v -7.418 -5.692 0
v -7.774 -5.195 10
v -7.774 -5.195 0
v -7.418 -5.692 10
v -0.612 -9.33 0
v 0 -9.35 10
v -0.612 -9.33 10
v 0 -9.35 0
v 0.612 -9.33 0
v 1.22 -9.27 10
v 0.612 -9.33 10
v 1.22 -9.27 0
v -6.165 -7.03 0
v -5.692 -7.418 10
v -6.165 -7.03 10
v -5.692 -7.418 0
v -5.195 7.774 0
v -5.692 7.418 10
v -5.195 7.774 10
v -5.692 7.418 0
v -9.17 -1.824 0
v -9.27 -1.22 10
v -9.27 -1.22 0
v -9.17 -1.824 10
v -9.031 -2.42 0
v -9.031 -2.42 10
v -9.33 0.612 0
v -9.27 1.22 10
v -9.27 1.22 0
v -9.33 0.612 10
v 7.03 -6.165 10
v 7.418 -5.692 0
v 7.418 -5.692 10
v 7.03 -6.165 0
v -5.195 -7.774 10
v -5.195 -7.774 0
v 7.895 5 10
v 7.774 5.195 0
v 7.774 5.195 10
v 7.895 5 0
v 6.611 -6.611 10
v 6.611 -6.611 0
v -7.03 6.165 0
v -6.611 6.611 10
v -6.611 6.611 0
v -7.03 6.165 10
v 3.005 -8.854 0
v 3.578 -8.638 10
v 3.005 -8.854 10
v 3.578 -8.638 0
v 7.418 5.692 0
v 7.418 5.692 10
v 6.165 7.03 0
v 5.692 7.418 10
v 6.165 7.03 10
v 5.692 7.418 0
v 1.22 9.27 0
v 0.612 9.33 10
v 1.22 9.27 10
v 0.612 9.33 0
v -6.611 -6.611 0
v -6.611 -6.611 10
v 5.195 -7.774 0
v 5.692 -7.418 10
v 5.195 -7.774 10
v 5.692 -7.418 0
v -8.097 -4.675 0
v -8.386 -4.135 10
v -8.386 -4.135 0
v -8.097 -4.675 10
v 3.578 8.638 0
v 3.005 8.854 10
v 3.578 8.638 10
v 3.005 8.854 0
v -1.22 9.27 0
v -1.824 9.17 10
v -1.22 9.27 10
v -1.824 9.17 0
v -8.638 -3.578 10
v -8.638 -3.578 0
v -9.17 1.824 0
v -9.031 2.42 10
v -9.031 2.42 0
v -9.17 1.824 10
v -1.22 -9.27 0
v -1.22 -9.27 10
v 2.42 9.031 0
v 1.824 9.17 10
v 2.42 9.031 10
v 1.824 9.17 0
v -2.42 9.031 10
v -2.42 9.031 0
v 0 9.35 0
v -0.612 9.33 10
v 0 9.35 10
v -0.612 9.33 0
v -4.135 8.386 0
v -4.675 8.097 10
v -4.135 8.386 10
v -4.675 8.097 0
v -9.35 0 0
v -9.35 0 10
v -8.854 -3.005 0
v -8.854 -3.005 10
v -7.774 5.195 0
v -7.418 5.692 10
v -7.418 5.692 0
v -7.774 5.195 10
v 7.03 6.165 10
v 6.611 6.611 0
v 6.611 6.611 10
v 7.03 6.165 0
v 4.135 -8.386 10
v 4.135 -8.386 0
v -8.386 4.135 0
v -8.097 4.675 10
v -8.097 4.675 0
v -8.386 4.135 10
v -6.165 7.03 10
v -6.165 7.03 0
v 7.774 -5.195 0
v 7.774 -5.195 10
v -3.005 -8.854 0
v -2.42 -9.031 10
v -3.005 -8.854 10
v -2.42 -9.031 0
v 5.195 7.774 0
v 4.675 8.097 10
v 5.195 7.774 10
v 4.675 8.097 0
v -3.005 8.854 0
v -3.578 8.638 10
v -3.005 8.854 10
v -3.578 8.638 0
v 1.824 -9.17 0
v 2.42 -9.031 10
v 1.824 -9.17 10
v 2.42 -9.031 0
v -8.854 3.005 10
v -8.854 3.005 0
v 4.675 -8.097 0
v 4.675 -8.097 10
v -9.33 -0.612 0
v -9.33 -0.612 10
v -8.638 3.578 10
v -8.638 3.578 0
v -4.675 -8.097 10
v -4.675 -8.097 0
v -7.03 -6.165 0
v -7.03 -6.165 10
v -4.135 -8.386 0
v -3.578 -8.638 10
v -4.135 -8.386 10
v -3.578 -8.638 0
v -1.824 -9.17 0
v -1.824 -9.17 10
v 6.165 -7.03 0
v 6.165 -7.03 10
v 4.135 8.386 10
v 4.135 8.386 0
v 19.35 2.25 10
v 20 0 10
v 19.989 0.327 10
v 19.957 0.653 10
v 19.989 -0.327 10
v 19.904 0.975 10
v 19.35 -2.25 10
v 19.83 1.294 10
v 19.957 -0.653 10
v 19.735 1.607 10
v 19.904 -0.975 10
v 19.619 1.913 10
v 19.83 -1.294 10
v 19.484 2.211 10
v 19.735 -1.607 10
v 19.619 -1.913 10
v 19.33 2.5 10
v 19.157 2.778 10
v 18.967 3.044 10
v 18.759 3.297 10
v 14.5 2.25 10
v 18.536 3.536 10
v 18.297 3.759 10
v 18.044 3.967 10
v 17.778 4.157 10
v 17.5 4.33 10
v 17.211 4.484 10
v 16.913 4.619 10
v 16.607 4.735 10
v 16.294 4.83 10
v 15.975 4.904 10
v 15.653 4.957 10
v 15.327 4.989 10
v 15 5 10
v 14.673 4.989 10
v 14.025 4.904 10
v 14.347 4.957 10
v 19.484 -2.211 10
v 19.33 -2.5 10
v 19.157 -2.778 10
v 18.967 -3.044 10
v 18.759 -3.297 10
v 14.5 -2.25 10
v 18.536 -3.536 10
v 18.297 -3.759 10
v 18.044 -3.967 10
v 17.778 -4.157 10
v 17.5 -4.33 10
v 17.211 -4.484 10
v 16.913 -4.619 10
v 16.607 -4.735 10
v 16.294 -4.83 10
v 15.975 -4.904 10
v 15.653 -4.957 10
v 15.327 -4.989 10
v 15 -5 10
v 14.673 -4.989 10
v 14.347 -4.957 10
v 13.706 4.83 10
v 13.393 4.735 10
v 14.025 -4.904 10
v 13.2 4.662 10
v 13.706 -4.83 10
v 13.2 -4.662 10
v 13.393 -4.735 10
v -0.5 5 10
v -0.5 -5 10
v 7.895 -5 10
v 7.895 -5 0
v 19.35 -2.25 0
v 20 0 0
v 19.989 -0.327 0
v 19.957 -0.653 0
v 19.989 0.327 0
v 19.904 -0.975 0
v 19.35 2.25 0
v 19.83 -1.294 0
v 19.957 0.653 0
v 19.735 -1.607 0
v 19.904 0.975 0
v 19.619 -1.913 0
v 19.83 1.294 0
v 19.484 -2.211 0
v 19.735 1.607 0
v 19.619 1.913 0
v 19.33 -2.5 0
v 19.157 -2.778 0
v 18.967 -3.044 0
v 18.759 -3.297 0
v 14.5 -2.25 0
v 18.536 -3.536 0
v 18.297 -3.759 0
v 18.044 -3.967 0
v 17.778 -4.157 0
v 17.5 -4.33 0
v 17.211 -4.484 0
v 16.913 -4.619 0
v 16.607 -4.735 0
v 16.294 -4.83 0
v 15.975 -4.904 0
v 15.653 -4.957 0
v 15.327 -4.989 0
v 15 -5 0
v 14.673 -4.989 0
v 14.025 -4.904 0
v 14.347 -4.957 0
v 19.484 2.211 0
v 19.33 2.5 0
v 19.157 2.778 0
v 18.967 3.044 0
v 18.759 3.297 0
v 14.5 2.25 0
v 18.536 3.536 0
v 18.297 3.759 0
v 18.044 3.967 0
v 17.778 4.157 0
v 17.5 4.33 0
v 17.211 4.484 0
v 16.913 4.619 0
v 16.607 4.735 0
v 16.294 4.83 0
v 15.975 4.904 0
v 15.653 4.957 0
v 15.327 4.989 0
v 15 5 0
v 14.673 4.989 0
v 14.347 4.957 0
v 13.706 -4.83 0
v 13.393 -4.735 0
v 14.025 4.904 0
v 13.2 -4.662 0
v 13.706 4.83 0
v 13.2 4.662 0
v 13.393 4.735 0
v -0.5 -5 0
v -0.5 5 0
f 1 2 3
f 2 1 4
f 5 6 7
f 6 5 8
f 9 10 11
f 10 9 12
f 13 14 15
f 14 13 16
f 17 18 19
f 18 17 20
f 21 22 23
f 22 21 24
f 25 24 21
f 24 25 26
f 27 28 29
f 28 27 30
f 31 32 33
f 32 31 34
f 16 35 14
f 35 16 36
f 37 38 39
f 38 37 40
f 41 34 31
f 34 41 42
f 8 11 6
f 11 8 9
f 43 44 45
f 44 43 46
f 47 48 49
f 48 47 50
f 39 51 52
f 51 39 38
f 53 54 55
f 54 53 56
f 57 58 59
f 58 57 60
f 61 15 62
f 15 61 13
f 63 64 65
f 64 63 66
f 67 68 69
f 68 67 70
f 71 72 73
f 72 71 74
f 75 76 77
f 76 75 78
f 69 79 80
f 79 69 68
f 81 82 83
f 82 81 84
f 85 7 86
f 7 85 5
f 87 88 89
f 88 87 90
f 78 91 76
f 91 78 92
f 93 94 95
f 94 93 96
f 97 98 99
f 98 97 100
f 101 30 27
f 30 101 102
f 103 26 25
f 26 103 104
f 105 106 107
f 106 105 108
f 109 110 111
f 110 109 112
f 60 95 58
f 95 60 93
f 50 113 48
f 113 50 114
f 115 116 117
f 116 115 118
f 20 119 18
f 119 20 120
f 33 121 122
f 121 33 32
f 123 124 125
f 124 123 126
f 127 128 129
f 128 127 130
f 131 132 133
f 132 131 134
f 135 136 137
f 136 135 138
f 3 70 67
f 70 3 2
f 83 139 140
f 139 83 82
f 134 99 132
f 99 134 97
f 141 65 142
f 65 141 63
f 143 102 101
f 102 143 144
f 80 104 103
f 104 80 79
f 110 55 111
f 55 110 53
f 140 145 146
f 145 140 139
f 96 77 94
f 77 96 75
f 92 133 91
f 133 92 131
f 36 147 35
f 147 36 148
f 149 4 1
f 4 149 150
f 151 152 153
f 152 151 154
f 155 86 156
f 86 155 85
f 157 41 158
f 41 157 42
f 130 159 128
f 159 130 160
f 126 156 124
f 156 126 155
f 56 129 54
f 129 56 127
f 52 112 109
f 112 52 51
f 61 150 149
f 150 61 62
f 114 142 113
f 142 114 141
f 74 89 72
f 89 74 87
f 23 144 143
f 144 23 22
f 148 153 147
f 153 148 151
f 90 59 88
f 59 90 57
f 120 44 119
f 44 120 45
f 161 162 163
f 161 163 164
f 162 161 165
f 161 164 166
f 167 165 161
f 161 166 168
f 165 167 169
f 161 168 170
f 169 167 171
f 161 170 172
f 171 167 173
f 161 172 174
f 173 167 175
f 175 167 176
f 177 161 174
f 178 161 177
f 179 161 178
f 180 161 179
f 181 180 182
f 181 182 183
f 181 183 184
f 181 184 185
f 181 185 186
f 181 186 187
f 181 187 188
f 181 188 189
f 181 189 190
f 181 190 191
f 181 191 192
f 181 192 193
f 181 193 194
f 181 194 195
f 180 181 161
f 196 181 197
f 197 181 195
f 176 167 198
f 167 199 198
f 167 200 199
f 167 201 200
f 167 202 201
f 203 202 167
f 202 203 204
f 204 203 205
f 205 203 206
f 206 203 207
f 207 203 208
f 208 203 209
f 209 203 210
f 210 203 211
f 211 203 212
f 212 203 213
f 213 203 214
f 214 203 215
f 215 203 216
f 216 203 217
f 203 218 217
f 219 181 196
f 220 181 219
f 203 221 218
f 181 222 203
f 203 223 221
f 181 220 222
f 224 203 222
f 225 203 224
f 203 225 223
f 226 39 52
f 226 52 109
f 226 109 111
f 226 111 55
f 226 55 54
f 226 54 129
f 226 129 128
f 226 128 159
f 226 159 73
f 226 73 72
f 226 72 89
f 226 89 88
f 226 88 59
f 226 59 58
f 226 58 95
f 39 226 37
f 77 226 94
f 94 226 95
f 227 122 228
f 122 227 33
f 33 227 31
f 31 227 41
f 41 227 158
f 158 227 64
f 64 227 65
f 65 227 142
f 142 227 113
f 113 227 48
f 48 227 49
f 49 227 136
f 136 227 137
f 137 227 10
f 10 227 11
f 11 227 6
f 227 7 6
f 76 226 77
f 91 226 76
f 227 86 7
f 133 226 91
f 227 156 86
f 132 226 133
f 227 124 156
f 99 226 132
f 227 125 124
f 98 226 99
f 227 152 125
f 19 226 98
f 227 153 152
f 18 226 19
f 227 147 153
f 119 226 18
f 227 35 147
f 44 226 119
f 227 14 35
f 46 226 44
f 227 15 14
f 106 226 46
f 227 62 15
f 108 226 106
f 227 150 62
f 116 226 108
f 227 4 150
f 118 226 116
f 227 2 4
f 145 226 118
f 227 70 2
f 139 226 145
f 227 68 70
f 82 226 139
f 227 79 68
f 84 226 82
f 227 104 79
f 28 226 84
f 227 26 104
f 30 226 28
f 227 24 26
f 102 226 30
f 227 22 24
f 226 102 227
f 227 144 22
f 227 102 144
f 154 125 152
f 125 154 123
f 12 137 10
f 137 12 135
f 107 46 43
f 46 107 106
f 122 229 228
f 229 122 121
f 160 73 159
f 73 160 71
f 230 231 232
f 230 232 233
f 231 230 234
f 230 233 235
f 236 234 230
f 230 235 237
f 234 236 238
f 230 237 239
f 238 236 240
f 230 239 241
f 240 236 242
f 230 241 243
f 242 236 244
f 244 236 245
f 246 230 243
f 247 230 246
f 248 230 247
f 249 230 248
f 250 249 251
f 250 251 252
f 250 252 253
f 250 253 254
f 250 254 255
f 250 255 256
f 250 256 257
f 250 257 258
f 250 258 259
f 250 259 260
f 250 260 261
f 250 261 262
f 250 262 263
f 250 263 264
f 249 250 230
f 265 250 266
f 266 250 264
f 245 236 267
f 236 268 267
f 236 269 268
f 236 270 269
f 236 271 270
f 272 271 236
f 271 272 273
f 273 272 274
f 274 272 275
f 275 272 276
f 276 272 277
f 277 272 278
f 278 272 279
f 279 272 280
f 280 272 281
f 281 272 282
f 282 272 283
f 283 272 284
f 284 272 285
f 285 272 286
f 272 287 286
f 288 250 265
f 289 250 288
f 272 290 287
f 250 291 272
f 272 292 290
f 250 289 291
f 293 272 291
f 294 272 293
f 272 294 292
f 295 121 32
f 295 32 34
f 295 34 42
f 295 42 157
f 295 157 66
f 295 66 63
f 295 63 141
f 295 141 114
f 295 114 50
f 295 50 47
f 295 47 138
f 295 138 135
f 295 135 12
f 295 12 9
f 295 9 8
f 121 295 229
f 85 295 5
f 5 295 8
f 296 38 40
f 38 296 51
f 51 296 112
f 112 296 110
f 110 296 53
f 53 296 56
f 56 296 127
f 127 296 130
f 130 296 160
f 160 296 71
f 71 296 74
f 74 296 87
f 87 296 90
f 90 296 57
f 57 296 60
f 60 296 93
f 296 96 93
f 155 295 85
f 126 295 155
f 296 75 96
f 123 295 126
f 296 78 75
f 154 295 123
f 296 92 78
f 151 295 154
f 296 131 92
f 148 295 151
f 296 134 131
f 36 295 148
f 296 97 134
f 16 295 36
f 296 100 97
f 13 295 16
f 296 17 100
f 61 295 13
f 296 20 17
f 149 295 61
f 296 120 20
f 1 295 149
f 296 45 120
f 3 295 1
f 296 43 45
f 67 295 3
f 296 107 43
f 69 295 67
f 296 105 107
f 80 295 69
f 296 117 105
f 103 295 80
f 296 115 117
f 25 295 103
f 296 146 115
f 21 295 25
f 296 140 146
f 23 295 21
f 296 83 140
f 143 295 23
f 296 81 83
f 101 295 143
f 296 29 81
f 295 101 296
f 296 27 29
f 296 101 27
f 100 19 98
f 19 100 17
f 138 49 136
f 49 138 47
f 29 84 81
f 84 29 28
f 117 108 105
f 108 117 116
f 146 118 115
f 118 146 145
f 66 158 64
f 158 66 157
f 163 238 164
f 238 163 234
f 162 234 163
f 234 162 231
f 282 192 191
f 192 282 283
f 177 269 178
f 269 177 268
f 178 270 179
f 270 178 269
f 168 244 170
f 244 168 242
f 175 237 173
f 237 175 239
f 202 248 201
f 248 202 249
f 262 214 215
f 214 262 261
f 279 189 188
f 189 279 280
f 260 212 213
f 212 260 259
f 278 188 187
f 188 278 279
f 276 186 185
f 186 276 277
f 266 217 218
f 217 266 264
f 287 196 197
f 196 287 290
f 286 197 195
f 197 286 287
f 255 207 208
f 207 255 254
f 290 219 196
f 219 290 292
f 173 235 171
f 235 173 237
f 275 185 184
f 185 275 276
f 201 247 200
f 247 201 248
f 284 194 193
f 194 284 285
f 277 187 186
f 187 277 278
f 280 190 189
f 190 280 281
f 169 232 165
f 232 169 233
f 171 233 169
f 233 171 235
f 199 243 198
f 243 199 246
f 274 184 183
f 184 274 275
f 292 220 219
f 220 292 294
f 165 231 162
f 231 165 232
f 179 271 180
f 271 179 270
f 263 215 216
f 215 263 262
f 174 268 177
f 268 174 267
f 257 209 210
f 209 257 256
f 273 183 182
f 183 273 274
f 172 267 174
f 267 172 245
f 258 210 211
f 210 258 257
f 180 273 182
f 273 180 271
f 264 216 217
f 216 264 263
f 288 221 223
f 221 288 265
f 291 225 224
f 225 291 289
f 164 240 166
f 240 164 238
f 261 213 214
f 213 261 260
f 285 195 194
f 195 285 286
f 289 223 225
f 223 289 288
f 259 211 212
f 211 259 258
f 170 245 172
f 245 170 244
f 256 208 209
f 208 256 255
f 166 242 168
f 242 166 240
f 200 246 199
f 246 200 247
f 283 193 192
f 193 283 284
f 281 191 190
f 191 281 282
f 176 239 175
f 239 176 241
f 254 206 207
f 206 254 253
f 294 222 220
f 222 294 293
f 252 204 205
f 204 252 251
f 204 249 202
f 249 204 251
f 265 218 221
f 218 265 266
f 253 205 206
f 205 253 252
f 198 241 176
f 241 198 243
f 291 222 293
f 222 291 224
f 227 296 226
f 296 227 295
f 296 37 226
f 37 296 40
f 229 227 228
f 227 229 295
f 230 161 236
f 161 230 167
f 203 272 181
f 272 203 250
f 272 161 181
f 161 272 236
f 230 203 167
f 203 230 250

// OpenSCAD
// Tubing clip for a 12.7 mm (1/2 inch) lab stand rod
// Print orientation: flat on the bed, extruded upward in +Z

// ---------------- Parameters ----------------
rod_d        = 12.7;   // stand rod diameter
ring_w       = 3;      // rod ring wall thickness
ring_od      = rod_d + 2 * ring_w;  // rod ring outer diameter (18.7 mm)
ring_id      = rod_d;  // rod ring inner diameter (12.7 mm)

tub_d        = 6;      // tubing ring inner diameter
tub_w        = 2;      // tubing ring wall thickness
tub_od       = tub_d + 2 * tub_w;  // tubing ring outer diameter (10 mm)
tub_x        = 15;     // tubing ring centre X position

bridge_x0    = 8;      // bridge start (X)
bridge_x1    = 12;     // bridge end (X)
bridge_w     = 6;      // bridge width (Y)

opening_rod  = 10;     // rod ring opening width (Y), on -X side
opening_tub  = 4.5;    // tubing ring opening width (Y), on +X side

height       = 10;     // extrusion height (Z)

eps          = 0.5;    // cutter overshoot past faces

$fn = 96;

// ---------------- Model ----------------
difference() {
    union() {
        // Rod ring
        cylinder(d = ring_od, h = height);

        // Tubing ring
        translate([tub_x, 0, 0])
            cylinder(d = tub_od, h = height);

        // Solid bridge between the rings
        translate([bridge_x0, -bridge_w / 2, 0])
            cube([bridge_x1 - bridge_x0, bridge_w, height]);
    }

    // Rod ring opening: x < 0 and -5 < y < 5
    translate([-eps, -opening_rod / 2, -eps])
        cube([rod_d + 2 * eps, opening_rod, height + 2 * eps]);

    // Tubing ring opening: x > 15 and -2.25 < y < 2.25
    translate([tub_x - eps, -opening_tub / 2, -eps])
        cube([eps + (ring_od / 2 - tub_od / 2), opening_tub, height + 2 * eps]);
}
